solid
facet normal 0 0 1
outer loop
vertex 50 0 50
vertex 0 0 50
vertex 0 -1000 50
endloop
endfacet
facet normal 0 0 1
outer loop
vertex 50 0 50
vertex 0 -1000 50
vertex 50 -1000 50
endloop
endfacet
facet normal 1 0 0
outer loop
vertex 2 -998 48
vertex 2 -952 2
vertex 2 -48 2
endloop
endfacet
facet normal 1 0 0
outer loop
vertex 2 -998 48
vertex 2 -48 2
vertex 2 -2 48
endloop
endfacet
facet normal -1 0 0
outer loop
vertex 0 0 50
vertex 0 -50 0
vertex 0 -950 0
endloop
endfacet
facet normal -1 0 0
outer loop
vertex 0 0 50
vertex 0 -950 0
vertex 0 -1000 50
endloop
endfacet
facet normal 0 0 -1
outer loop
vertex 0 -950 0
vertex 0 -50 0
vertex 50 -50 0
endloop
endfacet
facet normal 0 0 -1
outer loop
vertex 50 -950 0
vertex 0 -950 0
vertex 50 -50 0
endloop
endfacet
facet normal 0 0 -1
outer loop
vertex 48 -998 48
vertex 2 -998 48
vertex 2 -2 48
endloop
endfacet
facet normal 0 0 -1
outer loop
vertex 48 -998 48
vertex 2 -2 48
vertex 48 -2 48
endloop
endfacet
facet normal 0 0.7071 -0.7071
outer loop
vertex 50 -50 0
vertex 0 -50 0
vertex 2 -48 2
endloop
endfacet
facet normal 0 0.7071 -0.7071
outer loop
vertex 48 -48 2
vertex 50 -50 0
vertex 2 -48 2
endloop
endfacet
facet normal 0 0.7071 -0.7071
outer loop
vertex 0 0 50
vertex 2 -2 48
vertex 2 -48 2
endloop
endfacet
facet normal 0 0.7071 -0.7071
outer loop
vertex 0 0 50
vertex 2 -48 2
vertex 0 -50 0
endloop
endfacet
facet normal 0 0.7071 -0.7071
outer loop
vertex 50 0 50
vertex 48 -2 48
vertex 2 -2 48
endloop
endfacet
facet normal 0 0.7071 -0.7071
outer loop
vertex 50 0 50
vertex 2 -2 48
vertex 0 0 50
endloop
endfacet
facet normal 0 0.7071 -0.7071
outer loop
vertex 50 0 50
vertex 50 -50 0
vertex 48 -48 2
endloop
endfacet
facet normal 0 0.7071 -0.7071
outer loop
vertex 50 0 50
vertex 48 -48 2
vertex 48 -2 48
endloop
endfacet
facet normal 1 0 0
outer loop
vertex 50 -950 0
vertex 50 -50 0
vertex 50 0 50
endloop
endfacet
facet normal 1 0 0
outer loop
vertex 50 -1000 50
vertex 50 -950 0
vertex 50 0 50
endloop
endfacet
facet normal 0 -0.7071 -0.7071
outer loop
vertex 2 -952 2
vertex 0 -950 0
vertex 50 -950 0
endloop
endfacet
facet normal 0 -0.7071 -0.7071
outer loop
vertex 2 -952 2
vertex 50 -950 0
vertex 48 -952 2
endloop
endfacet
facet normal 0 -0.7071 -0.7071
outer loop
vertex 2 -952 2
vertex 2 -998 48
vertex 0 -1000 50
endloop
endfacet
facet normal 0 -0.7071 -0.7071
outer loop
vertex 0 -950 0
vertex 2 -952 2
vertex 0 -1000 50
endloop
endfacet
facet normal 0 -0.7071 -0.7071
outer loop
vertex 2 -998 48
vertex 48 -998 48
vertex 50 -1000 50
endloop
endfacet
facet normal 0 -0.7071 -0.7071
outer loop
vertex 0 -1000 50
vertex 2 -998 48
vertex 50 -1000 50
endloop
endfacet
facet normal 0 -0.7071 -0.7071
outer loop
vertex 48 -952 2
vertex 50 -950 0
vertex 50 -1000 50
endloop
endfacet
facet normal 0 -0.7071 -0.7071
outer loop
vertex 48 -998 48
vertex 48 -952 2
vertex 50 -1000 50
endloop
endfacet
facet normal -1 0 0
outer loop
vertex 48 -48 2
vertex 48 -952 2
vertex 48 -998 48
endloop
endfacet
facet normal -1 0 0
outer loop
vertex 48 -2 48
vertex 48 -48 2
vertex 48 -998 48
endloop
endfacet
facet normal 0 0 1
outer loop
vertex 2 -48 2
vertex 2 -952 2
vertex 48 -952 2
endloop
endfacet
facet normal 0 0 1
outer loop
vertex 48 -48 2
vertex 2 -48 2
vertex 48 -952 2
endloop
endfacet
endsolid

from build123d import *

# Parameters (mm, degrees)
F0_W     = 50
F0_H     = 50
F0_W_2   = 46
F0_H_2   = 46
F1_DEPTH = 1000
F3_DEPTH = 50.001


# Not quite as in the source:
# - a pattern or mirror of a feature is missing from the dataset's text; its kind, count and spacing are read off the source's solid


with BuildPart() as f1:
    # F0 (on Front) → F1 (new body)
    with BuildSketch(Plane.XZ):
        with Locations((25, 25)):
            Rectangle(F0_W, F0_H)
        with Locations((25, 25)):
            Rectangle(F0_W_2, F0_H_2, mode=Mode.SUBTRACT)
    extrude(amount=F1_DEPTH)

    # F2 (on face) → F3 (cut, through all)
    with BuildSketch(Plane.YZ.offset(50)):
        Polygon((-950, 0), (-1000, 50), (-1000, 0), align=None)
    f3 = extrude(amount=-F3_DEPTH, mode=Mode.SUBTRACT)

    # F3_copies: F3 across plane
    add(f3.mirror(Plane.ZX.offset(-500)), mode=Mode.SUBTRACT)


solid = f1.part
